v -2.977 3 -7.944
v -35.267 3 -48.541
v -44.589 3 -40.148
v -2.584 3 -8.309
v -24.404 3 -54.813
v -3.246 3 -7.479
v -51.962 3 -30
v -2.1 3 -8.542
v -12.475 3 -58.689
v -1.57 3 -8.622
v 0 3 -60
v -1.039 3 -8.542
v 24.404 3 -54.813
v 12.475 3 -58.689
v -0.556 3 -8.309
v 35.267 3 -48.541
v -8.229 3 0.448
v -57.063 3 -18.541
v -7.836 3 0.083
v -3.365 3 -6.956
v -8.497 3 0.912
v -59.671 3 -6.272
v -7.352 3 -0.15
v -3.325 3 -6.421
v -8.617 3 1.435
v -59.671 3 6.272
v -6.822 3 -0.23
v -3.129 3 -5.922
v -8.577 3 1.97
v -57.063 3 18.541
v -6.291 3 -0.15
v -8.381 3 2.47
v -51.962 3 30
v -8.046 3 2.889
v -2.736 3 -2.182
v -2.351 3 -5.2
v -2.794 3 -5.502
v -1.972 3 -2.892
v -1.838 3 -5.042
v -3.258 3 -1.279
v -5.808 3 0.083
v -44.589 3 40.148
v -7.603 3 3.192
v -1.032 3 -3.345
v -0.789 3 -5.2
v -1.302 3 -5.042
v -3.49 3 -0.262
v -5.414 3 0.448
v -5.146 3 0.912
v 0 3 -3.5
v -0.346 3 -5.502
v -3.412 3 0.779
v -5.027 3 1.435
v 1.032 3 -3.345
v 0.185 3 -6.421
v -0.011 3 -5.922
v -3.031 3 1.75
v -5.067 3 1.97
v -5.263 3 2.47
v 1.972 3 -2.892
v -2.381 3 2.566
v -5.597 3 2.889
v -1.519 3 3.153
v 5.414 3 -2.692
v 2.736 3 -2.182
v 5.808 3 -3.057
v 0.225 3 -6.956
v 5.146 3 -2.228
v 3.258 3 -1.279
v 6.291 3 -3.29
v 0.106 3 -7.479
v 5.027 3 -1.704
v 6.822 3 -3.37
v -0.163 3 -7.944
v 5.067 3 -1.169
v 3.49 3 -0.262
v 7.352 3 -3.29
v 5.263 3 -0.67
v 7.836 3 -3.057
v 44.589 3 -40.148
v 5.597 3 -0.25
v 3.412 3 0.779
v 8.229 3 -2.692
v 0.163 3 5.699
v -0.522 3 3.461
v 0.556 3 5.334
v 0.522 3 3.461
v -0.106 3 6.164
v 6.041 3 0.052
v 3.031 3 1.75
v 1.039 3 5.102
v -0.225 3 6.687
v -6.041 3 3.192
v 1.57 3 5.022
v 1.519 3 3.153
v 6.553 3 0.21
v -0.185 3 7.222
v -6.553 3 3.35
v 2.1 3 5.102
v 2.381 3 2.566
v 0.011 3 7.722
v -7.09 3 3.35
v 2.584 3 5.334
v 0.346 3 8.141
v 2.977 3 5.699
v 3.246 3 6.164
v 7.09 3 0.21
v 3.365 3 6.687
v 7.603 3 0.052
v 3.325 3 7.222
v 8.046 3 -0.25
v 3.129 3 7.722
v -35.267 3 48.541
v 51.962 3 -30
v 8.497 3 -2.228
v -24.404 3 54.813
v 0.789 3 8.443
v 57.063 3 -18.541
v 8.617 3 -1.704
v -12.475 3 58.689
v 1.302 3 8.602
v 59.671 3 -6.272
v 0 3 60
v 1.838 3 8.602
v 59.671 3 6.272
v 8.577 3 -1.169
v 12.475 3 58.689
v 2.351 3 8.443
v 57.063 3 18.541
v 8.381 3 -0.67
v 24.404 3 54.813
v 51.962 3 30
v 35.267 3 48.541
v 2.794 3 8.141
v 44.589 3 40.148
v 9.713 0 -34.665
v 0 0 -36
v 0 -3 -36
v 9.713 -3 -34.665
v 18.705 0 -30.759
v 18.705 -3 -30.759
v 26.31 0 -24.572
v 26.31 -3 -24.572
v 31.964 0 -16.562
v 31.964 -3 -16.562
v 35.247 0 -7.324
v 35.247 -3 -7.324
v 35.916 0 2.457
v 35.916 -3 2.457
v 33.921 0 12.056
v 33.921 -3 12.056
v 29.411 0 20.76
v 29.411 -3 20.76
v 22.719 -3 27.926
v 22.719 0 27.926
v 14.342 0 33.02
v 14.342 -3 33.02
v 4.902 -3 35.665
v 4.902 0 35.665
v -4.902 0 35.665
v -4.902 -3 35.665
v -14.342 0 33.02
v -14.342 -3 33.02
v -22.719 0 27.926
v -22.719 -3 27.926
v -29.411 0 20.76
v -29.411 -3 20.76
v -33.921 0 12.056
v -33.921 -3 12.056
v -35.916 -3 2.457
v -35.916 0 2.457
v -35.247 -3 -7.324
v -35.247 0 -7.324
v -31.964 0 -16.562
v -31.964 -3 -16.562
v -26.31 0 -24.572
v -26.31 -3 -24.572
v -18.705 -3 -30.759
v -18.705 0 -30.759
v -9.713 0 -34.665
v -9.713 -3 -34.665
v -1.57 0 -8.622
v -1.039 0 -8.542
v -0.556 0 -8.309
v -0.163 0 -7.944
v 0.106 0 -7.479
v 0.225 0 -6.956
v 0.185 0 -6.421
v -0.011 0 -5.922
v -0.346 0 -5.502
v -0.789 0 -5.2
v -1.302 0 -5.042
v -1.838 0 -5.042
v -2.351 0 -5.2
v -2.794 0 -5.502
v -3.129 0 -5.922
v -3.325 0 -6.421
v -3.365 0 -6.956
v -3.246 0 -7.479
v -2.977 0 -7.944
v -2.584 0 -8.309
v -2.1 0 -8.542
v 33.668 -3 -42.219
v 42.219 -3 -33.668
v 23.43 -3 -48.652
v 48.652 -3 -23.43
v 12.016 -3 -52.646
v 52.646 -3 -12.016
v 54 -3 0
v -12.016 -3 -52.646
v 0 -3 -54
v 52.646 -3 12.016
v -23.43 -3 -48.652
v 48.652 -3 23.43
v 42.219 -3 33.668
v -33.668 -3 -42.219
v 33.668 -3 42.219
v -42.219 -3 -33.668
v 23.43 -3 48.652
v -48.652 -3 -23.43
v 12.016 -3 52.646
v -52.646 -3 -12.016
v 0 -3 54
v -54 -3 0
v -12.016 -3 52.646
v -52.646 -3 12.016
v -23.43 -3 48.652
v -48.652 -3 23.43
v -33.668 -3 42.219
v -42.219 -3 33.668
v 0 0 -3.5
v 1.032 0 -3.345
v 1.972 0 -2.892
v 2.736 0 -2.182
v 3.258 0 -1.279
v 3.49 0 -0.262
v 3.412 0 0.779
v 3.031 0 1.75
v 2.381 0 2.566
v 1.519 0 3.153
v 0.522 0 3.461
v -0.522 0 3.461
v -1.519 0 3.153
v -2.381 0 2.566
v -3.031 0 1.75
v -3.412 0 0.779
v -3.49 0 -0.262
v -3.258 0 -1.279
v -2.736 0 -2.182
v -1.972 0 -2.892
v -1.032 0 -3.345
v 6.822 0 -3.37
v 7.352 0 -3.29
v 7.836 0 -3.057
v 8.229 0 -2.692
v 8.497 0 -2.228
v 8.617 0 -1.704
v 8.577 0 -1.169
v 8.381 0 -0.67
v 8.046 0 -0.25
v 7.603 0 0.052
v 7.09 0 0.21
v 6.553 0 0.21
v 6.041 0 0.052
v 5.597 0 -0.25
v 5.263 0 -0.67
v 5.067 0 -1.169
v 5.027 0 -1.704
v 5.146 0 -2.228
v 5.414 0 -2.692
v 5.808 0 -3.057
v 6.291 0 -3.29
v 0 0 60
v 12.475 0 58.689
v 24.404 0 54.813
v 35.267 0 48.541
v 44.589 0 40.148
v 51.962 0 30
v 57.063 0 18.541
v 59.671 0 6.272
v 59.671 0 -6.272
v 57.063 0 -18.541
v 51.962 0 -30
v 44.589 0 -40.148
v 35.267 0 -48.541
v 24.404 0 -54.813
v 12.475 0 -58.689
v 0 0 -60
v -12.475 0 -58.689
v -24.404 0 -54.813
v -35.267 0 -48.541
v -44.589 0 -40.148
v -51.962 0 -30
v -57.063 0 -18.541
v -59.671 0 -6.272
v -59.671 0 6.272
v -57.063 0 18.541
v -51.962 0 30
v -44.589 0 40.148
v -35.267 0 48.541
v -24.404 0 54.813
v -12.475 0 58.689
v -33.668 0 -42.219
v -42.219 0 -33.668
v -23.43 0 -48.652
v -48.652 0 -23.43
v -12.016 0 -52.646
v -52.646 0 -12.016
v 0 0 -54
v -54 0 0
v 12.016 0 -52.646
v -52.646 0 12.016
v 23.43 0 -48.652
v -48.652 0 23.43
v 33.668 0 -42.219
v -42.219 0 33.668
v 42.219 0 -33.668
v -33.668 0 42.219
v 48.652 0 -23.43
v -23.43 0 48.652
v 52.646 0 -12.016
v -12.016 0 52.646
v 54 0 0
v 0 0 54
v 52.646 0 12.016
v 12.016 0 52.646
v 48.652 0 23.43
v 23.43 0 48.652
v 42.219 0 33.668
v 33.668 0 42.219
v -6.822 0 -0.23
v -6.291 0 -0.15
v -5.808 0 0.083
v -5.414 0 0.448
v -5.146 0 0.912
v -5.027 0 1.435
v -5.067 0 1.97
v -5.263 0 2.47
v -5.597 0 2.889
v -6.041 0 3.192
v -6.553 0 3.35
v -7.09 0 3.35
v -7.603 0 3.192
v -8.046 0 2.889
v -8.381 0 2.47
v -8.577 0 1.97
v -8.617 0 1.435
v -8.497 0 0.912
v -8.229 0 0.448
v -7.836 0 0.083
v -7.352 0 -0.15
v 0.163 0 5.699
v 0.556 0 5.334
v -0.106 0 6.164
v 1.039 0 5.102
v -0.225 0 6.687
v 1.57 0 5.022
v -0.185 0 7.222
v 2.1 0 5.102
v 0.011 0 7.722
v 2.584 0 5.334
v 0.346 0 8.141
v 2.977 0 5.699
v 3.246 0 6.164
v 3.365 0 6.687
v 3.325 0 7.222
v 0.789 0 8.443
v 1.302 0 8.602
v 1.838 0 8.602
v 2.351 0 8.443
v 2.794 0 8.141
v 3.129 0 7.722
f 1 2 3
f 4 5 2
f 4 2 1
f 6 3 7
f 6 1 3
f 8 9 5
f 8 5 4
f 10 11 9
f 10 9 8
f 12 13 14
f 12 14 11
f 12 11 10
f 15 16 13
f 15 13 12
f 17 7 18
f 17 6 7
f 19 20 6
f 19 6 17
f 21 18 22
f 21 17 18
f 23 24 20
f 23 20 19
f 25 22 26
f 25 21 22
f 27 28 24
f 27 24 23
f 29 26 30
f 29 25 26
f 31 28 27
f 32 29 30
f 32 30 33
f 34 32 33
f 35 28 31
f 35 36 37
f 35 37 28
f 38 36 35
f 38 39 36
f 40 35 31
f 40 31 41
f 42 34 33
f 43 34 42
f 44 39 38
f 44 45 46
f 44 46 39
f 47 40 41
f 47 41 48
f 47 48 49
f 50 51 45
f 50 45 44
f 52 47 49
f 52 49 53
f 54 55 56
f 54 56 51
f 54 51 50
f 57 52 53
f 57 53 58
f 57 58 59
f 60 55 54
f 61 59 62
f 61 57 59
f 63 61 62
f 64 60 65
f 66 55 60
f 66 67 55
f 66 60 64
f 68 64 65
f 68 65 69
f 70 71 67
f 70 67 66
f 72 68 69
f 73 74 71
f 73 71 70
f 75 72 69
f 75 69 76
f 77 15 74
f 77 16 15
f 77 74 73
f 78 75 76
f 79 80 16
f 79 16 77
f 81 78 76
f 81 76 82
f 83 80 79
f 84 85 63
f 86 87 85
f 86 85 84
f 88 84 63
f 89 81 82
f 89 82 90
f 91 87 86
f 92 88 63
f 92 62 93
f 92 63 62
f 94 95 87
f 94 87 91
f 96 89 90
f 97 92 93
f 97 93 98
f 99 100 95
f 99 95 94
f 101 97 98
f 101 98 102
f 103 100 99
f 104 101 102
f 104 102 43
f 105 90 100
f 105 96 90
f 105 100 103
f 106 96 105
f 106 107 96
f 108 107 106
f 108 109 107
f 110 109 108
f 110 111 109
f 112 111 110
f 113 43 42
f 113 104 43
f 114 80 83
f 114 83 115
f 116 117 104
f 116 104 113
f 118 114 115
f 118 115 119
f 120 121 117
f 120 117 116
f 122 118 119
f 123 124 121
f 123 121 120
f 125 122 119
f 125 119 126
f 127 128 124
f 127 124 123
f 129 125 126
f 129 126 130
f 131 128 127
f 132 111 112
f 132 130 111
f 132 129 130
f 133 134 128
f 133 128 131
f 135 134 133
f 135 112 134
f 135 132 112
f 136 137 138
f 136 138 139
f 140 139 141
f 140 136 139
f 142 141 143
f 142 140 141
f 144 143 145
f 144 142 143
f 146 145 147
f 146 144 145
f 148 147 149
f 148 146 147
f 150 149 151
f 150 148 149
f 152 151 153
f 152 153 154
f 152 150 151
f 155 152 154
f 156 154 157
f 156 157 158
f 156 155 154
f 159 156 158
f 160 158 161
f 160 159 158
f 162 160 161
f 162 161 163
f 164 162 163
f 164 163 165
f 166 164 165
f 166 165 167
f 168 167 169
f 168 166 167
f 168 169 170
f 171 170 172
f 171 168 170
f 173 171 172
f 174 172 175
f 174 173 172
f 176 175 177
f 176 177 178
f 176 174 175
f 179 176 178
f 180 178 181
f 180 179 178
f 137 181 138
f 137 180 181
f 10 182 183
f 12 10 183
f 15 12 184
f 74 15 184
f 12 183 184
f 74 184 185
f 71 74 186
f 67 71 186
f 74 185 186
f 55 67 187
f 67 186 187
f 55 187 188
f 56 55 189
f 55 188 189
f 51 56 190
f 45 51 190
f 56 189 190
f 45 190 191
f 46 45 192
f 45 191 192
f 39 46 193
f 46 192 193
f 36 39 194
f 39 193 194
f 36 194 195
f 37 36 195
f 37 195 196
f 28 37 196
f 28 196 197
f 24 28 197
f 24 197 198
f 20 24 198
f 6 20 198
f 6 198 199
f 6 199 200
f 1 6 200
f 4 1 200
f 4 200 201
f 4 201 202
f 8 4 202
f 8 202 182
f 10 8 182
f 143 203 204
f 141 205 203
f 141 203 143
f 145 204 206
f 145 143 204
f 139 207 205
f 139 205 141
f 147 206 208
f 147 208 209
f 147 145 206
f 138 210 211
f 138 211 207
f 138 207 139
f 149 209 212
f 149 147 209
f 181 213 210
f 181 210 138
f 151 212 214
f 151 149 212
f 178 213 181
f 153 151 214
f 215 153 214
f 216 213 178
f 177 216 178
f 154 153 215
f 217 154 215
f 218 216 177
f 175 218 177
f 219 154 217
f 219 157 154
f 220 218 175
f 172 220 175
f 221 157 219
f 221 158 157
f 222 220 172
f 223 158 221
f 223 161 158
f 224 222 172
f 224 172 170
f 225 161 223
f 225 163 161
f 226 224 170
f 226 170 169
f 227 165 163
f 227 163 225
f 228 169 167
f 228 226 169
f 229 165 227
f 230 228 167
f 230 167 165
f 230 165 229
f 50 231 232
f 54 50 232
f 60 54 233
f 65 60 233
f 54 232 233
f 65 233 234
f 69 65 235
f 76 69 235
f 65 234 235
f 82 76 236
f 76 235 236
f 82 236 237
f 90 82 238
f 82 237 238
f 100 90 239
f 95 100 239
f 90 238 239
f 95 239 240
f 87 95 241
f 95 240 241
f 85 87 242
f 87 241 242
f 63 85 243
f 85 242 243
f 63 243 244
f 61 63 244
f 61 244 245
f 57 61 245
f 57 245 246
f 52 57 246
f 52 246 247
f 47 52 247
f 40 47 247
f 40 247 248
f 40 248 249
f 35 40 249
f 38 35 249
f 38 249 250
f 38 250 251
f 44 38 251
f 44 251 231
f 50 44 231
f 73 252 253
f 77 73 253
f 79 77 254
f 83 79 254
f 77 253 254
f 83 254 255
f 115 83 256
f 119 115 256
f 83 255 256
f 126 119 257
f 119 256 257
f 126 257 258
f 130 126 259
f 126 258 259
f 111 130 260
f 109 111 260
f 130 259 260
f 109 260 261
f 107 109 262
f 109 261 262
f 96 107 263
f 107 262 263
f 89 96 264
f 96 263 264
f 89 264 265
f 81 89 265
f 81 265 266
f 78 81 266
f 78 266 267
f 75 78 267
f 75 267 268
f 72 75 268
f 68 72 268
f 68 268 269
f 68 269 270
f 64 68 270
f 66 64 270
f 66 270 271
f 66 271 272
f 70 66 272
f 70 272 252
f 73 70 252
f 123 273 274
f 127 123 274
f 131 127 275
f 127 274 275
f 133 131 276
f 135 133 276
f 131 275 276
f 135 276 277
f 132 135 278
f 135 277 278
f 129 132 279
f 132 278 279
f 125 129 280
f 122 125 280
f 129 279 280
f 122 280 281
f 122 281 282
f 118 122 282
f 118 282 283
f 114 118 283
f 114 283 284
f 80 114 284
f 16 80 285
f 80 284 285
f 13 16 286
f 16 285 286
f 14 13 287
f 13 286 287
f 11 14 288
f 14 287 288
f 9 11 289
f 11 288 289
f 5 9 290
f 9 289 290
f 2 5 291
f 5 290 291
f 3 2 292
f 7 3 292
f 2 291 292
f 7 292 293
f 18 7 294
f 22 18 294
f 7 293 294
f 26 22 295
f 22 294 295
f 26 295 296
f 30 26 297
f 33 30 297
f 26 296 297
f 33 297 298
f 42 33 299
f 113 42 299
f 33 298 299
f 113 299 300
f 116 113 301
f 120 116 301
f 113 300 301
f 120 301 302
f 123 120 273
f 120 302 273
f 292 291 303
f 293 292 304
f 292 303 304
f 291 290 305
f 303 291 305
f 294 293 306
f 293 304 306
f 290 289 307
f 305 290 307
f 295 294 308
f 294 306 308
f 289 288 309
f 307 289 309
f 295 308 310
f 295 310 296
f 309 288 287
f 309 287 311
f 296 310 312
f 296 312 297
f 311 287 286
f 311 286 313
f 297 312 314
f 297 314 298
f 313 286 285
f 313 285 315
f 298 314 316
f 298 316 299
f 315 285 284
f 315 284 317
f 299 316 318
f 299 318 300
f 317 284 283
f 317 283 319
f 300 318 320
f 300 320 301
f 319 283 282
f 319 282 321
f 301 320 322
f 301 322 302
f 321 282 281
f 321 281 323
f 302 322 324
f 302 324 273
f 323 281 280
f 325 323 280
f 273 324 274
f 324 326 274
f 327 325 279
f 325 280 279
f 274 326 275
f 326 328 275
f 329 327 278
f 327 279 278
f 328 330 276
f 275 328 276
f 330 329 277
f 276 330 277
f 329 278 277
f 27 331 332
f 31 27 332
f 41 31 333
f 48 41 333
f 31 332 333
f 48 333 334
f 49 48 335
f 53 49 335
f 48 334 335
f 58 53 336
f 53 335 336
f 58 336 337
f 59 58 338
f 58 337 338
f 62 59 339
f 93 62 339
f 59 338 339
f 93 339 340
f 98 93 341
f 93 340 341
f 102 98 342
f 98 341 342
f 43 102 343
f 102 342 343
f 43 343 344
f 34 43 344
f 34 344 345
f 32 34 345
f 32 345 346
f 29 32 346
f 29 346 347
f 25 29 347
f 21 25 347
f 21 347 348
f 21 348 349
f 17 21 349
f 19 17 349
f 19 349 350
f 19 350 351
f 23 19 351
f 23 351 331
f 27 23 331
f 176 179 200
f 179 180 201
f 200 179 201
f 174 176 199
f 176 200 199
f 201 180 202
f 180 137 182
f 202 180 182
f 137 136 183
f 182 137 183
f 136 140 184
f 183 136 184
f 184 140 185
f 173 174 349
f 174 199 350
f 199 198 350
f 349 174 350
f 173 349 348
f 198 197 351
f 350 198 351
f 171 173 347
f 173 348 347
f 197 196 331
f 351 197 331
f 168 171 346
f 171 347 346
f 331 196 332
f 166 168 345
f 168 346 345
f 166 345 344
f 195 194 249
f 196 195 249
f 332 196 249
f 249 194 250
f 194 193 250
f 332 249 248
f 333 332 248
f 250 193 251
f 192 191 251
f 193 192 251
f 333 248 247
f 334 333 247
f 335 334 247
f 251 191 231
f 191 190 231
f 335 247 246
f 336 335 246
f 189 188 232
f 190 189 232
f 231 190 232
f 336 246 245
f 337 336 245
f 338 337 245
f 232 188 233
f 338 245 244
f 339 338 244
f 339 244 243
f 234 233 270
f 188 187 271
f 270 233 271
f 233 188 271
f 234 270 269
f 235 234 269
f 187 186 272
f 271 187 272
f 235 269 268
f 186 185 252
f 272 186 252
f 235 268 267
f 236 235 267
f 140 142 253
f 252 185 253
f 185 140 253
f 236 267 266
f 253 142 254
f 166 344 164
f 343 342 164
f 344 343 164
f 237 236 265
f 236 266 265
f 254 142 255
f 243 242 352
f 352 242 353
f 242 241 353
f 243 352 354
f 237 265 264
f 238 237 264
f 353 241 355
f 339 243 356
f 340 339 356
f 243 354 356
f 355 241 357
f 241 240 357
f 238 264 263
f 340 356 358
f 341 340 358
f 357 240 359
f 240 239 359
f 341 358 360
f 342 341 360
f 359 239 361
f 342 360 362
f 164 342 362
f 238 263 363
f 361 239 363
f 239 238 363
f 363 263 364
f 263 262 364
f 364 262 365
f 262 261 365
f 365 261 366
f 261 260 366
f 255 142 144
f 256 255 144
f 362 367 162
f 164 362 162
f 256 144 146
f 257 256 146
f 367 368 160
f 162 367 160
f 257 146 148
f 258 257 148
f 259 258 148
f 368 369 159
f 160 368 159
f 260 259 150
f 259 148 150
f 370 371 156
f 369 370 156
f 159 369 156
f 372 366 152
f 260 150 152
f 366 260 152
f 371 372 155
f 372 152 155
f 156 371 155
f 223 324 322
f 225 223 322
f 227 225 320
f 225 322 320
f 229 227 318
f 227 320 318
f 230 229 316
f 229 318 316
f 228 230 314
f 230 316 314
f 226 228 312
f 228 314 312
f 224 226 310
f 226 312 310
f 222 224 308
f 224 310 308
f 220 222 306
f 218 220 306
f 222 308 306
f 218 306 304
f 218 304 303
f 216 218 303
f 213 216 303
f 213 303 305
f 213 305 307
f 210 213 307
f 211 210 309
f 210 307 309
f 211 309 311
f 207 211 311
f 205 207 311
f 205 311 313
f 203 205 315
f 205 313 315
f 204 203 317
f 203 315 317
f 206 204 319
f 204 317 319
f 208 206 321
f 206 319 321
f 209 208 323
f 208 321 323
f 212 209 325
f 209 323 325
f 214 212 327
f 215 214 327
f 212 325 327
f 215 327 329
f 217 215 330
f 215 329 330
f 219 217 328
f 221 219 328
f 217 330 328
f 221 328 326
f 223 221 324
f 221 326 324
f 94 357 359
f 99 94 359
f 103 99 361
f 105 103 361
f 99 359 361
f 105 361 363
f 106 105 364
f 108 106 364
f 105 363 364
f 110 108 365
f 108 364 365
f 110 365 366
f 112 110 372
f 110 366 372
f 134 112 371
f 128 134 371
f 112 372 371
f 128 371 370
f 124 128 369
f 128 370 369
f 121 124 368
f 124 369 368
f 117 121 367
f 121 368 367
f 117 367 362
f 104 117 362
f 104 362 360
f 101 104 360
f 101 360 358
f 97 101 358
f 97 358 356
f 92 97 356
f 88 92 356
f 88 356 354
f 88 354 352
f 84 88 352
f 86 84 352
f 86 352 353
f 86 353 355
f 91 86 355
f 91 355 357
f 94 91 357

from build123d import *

# Parameters (mm, degrees)
SKETCH1_R           = 60
BOSS_EXTRUDE1_DEPTH = 3
CUT_EXTRUDE1_REACH  = 86.906
SKETCH2_R           = 3.5
SKETCH2_R_2         = 1.8
SKETCH3_R           = 54
SKETCH3_R_2         = 36
BOSS_EXTRUDE2_DEPTH = 3


with BuildPart() as part:
    # Sketch1 → Boss-Extrude1 (new body)
    with BuildSketch(Plane(origin=(0, 0, 0), x_dir=(1, 0, 0), z_dir=(0, 1, 0))):
        with Locations(Location((0, 0, 0), (0, 0, 270))):
            Circle(SKETCH1_R)
    extrude(amount=BOSS_EXTRUDE1_DEPTH)

    # Sketch2 → Cut-Extrude1 (cut, up to next)
    with BuildSketch(Plane.XZ, mode=Mode.PRIVATE) as cut_extrude1_sk1:
        with Locations(Location((0, 0, 0), (0, 0, 270))):
            Circle(SKETCH2_R)
    cut_extrude1_tool1 = extrude(cut_extrude1_sk1.sketch, amount=-CUT_EXTRUDE1_REACH, mode=Mode.PRIVATE) & part.part
    # Sketch2 → Cut-Extrude1 (cut, up to next)
    with BuildSketch(Plane.XZ, mode=Mode.PRIVATE) as cut_extrude1_sk2:
        with Locations(Location((1.56993281, 6.821679483, 0), (0, 0, 270))):
            Circle(SKETCH2_R_2)
    cut_extrude1_tool2 = extrude(cut_extrude1_sk2.sketch, amount=-CUT_EXTRUDE1_REACH, mode=Mode.PRIVATE) & part.part
    # Sketch2 → Cut-Extrude1 (cut, up to next)
    with BuildSketch(Plane.XZ, mode=Mode.PRIVATE) as cut_extrude1_sk3:
        with Locations(Location((6.821679483, -1.56993281, 0), (0, 0, 270))):
            Circle(SKETCH2_R_2)
    cut_extrude1_tool3 = extrude(cut_extrude1_sk3.sketch, amount=-CUT_EXTRUDE1_REACH, mode=Mode.PRIVATE) & part.part
    # Sketch2 → Cut-Extrude1 (cut, up to next)
    with BuildSketch(Plane.XZ, mode=Mode.PRIVATE) as cut_extrude1_sk4:
        with Locations(Location((-1.56993281, -6.821679483, 0), (0, 0, 270))):
            Circle(SKETCH2_R_2)
    cut_extrude1_tool4 = extrude(cut_extrude1_sk4.sketch, amount=-CUT_EXTRUDE1_REACH, mode=Mode.PRIVATE) & part.part
    # Sketch2 → Cut-Extrude1 (cut, up to next)
    with BuildSketch(Plane.XZ, mode=Mode.PRIVATE) as cut_extrude1_sk5:
        with Locations(Location((-6.821679483, 1.56993281, 0), (0, 0, 270))):
            Circle(SKETCH2_R_2)
    cut_extrude1_tool5 = extrude(cut_extrude1_sk5.sketch, amount=-CUT_EXTRUDE1_REACH, mode=Mode.PRIVATE) & part.part
    add(cut_extrude1_tool1.solids().sort_by_distance((0, 0, 0))[0], mode=Mode.SUBTRACT)
    add(cut_extrude1_tool2.solids().sort_by_distance((1.569933, 0, 6.821679))[0], mode=Mode.SUBTRACT)
    add(cut_extrude1_tool3.solids().sort_by_distance((6.821679, 0, -1.569933))[0], mode=Mode.SUBTRACT)
    add(cut_extrude1_tool4.solids().sort_by_distance((-1.569933, 0, -6.821679))[0], mode=Mode.SUBTRACT)
    add(cut_extrude1_tool5.solids().sort_by_distance((-6.821679, 0, 1.569933))[0], mode=Mode.SUBTRACT)

    # Sketch3 → Boss-Extrude2 (add)
    with BuildSketch(Plane.XZ):
        with Locations(Location((0, 0, 0), (0, 0, 90))):
            Circle(SKETCH3_R)
        with Locations(Location((0, 0, 0), (0, 0, 270))):
            Circle(SKETCH3_R_2, mode=Mode.SUBTRACT)
    extrude(amount=BOSS_EXTRUDE2_DEPTH)


solid = part.part
